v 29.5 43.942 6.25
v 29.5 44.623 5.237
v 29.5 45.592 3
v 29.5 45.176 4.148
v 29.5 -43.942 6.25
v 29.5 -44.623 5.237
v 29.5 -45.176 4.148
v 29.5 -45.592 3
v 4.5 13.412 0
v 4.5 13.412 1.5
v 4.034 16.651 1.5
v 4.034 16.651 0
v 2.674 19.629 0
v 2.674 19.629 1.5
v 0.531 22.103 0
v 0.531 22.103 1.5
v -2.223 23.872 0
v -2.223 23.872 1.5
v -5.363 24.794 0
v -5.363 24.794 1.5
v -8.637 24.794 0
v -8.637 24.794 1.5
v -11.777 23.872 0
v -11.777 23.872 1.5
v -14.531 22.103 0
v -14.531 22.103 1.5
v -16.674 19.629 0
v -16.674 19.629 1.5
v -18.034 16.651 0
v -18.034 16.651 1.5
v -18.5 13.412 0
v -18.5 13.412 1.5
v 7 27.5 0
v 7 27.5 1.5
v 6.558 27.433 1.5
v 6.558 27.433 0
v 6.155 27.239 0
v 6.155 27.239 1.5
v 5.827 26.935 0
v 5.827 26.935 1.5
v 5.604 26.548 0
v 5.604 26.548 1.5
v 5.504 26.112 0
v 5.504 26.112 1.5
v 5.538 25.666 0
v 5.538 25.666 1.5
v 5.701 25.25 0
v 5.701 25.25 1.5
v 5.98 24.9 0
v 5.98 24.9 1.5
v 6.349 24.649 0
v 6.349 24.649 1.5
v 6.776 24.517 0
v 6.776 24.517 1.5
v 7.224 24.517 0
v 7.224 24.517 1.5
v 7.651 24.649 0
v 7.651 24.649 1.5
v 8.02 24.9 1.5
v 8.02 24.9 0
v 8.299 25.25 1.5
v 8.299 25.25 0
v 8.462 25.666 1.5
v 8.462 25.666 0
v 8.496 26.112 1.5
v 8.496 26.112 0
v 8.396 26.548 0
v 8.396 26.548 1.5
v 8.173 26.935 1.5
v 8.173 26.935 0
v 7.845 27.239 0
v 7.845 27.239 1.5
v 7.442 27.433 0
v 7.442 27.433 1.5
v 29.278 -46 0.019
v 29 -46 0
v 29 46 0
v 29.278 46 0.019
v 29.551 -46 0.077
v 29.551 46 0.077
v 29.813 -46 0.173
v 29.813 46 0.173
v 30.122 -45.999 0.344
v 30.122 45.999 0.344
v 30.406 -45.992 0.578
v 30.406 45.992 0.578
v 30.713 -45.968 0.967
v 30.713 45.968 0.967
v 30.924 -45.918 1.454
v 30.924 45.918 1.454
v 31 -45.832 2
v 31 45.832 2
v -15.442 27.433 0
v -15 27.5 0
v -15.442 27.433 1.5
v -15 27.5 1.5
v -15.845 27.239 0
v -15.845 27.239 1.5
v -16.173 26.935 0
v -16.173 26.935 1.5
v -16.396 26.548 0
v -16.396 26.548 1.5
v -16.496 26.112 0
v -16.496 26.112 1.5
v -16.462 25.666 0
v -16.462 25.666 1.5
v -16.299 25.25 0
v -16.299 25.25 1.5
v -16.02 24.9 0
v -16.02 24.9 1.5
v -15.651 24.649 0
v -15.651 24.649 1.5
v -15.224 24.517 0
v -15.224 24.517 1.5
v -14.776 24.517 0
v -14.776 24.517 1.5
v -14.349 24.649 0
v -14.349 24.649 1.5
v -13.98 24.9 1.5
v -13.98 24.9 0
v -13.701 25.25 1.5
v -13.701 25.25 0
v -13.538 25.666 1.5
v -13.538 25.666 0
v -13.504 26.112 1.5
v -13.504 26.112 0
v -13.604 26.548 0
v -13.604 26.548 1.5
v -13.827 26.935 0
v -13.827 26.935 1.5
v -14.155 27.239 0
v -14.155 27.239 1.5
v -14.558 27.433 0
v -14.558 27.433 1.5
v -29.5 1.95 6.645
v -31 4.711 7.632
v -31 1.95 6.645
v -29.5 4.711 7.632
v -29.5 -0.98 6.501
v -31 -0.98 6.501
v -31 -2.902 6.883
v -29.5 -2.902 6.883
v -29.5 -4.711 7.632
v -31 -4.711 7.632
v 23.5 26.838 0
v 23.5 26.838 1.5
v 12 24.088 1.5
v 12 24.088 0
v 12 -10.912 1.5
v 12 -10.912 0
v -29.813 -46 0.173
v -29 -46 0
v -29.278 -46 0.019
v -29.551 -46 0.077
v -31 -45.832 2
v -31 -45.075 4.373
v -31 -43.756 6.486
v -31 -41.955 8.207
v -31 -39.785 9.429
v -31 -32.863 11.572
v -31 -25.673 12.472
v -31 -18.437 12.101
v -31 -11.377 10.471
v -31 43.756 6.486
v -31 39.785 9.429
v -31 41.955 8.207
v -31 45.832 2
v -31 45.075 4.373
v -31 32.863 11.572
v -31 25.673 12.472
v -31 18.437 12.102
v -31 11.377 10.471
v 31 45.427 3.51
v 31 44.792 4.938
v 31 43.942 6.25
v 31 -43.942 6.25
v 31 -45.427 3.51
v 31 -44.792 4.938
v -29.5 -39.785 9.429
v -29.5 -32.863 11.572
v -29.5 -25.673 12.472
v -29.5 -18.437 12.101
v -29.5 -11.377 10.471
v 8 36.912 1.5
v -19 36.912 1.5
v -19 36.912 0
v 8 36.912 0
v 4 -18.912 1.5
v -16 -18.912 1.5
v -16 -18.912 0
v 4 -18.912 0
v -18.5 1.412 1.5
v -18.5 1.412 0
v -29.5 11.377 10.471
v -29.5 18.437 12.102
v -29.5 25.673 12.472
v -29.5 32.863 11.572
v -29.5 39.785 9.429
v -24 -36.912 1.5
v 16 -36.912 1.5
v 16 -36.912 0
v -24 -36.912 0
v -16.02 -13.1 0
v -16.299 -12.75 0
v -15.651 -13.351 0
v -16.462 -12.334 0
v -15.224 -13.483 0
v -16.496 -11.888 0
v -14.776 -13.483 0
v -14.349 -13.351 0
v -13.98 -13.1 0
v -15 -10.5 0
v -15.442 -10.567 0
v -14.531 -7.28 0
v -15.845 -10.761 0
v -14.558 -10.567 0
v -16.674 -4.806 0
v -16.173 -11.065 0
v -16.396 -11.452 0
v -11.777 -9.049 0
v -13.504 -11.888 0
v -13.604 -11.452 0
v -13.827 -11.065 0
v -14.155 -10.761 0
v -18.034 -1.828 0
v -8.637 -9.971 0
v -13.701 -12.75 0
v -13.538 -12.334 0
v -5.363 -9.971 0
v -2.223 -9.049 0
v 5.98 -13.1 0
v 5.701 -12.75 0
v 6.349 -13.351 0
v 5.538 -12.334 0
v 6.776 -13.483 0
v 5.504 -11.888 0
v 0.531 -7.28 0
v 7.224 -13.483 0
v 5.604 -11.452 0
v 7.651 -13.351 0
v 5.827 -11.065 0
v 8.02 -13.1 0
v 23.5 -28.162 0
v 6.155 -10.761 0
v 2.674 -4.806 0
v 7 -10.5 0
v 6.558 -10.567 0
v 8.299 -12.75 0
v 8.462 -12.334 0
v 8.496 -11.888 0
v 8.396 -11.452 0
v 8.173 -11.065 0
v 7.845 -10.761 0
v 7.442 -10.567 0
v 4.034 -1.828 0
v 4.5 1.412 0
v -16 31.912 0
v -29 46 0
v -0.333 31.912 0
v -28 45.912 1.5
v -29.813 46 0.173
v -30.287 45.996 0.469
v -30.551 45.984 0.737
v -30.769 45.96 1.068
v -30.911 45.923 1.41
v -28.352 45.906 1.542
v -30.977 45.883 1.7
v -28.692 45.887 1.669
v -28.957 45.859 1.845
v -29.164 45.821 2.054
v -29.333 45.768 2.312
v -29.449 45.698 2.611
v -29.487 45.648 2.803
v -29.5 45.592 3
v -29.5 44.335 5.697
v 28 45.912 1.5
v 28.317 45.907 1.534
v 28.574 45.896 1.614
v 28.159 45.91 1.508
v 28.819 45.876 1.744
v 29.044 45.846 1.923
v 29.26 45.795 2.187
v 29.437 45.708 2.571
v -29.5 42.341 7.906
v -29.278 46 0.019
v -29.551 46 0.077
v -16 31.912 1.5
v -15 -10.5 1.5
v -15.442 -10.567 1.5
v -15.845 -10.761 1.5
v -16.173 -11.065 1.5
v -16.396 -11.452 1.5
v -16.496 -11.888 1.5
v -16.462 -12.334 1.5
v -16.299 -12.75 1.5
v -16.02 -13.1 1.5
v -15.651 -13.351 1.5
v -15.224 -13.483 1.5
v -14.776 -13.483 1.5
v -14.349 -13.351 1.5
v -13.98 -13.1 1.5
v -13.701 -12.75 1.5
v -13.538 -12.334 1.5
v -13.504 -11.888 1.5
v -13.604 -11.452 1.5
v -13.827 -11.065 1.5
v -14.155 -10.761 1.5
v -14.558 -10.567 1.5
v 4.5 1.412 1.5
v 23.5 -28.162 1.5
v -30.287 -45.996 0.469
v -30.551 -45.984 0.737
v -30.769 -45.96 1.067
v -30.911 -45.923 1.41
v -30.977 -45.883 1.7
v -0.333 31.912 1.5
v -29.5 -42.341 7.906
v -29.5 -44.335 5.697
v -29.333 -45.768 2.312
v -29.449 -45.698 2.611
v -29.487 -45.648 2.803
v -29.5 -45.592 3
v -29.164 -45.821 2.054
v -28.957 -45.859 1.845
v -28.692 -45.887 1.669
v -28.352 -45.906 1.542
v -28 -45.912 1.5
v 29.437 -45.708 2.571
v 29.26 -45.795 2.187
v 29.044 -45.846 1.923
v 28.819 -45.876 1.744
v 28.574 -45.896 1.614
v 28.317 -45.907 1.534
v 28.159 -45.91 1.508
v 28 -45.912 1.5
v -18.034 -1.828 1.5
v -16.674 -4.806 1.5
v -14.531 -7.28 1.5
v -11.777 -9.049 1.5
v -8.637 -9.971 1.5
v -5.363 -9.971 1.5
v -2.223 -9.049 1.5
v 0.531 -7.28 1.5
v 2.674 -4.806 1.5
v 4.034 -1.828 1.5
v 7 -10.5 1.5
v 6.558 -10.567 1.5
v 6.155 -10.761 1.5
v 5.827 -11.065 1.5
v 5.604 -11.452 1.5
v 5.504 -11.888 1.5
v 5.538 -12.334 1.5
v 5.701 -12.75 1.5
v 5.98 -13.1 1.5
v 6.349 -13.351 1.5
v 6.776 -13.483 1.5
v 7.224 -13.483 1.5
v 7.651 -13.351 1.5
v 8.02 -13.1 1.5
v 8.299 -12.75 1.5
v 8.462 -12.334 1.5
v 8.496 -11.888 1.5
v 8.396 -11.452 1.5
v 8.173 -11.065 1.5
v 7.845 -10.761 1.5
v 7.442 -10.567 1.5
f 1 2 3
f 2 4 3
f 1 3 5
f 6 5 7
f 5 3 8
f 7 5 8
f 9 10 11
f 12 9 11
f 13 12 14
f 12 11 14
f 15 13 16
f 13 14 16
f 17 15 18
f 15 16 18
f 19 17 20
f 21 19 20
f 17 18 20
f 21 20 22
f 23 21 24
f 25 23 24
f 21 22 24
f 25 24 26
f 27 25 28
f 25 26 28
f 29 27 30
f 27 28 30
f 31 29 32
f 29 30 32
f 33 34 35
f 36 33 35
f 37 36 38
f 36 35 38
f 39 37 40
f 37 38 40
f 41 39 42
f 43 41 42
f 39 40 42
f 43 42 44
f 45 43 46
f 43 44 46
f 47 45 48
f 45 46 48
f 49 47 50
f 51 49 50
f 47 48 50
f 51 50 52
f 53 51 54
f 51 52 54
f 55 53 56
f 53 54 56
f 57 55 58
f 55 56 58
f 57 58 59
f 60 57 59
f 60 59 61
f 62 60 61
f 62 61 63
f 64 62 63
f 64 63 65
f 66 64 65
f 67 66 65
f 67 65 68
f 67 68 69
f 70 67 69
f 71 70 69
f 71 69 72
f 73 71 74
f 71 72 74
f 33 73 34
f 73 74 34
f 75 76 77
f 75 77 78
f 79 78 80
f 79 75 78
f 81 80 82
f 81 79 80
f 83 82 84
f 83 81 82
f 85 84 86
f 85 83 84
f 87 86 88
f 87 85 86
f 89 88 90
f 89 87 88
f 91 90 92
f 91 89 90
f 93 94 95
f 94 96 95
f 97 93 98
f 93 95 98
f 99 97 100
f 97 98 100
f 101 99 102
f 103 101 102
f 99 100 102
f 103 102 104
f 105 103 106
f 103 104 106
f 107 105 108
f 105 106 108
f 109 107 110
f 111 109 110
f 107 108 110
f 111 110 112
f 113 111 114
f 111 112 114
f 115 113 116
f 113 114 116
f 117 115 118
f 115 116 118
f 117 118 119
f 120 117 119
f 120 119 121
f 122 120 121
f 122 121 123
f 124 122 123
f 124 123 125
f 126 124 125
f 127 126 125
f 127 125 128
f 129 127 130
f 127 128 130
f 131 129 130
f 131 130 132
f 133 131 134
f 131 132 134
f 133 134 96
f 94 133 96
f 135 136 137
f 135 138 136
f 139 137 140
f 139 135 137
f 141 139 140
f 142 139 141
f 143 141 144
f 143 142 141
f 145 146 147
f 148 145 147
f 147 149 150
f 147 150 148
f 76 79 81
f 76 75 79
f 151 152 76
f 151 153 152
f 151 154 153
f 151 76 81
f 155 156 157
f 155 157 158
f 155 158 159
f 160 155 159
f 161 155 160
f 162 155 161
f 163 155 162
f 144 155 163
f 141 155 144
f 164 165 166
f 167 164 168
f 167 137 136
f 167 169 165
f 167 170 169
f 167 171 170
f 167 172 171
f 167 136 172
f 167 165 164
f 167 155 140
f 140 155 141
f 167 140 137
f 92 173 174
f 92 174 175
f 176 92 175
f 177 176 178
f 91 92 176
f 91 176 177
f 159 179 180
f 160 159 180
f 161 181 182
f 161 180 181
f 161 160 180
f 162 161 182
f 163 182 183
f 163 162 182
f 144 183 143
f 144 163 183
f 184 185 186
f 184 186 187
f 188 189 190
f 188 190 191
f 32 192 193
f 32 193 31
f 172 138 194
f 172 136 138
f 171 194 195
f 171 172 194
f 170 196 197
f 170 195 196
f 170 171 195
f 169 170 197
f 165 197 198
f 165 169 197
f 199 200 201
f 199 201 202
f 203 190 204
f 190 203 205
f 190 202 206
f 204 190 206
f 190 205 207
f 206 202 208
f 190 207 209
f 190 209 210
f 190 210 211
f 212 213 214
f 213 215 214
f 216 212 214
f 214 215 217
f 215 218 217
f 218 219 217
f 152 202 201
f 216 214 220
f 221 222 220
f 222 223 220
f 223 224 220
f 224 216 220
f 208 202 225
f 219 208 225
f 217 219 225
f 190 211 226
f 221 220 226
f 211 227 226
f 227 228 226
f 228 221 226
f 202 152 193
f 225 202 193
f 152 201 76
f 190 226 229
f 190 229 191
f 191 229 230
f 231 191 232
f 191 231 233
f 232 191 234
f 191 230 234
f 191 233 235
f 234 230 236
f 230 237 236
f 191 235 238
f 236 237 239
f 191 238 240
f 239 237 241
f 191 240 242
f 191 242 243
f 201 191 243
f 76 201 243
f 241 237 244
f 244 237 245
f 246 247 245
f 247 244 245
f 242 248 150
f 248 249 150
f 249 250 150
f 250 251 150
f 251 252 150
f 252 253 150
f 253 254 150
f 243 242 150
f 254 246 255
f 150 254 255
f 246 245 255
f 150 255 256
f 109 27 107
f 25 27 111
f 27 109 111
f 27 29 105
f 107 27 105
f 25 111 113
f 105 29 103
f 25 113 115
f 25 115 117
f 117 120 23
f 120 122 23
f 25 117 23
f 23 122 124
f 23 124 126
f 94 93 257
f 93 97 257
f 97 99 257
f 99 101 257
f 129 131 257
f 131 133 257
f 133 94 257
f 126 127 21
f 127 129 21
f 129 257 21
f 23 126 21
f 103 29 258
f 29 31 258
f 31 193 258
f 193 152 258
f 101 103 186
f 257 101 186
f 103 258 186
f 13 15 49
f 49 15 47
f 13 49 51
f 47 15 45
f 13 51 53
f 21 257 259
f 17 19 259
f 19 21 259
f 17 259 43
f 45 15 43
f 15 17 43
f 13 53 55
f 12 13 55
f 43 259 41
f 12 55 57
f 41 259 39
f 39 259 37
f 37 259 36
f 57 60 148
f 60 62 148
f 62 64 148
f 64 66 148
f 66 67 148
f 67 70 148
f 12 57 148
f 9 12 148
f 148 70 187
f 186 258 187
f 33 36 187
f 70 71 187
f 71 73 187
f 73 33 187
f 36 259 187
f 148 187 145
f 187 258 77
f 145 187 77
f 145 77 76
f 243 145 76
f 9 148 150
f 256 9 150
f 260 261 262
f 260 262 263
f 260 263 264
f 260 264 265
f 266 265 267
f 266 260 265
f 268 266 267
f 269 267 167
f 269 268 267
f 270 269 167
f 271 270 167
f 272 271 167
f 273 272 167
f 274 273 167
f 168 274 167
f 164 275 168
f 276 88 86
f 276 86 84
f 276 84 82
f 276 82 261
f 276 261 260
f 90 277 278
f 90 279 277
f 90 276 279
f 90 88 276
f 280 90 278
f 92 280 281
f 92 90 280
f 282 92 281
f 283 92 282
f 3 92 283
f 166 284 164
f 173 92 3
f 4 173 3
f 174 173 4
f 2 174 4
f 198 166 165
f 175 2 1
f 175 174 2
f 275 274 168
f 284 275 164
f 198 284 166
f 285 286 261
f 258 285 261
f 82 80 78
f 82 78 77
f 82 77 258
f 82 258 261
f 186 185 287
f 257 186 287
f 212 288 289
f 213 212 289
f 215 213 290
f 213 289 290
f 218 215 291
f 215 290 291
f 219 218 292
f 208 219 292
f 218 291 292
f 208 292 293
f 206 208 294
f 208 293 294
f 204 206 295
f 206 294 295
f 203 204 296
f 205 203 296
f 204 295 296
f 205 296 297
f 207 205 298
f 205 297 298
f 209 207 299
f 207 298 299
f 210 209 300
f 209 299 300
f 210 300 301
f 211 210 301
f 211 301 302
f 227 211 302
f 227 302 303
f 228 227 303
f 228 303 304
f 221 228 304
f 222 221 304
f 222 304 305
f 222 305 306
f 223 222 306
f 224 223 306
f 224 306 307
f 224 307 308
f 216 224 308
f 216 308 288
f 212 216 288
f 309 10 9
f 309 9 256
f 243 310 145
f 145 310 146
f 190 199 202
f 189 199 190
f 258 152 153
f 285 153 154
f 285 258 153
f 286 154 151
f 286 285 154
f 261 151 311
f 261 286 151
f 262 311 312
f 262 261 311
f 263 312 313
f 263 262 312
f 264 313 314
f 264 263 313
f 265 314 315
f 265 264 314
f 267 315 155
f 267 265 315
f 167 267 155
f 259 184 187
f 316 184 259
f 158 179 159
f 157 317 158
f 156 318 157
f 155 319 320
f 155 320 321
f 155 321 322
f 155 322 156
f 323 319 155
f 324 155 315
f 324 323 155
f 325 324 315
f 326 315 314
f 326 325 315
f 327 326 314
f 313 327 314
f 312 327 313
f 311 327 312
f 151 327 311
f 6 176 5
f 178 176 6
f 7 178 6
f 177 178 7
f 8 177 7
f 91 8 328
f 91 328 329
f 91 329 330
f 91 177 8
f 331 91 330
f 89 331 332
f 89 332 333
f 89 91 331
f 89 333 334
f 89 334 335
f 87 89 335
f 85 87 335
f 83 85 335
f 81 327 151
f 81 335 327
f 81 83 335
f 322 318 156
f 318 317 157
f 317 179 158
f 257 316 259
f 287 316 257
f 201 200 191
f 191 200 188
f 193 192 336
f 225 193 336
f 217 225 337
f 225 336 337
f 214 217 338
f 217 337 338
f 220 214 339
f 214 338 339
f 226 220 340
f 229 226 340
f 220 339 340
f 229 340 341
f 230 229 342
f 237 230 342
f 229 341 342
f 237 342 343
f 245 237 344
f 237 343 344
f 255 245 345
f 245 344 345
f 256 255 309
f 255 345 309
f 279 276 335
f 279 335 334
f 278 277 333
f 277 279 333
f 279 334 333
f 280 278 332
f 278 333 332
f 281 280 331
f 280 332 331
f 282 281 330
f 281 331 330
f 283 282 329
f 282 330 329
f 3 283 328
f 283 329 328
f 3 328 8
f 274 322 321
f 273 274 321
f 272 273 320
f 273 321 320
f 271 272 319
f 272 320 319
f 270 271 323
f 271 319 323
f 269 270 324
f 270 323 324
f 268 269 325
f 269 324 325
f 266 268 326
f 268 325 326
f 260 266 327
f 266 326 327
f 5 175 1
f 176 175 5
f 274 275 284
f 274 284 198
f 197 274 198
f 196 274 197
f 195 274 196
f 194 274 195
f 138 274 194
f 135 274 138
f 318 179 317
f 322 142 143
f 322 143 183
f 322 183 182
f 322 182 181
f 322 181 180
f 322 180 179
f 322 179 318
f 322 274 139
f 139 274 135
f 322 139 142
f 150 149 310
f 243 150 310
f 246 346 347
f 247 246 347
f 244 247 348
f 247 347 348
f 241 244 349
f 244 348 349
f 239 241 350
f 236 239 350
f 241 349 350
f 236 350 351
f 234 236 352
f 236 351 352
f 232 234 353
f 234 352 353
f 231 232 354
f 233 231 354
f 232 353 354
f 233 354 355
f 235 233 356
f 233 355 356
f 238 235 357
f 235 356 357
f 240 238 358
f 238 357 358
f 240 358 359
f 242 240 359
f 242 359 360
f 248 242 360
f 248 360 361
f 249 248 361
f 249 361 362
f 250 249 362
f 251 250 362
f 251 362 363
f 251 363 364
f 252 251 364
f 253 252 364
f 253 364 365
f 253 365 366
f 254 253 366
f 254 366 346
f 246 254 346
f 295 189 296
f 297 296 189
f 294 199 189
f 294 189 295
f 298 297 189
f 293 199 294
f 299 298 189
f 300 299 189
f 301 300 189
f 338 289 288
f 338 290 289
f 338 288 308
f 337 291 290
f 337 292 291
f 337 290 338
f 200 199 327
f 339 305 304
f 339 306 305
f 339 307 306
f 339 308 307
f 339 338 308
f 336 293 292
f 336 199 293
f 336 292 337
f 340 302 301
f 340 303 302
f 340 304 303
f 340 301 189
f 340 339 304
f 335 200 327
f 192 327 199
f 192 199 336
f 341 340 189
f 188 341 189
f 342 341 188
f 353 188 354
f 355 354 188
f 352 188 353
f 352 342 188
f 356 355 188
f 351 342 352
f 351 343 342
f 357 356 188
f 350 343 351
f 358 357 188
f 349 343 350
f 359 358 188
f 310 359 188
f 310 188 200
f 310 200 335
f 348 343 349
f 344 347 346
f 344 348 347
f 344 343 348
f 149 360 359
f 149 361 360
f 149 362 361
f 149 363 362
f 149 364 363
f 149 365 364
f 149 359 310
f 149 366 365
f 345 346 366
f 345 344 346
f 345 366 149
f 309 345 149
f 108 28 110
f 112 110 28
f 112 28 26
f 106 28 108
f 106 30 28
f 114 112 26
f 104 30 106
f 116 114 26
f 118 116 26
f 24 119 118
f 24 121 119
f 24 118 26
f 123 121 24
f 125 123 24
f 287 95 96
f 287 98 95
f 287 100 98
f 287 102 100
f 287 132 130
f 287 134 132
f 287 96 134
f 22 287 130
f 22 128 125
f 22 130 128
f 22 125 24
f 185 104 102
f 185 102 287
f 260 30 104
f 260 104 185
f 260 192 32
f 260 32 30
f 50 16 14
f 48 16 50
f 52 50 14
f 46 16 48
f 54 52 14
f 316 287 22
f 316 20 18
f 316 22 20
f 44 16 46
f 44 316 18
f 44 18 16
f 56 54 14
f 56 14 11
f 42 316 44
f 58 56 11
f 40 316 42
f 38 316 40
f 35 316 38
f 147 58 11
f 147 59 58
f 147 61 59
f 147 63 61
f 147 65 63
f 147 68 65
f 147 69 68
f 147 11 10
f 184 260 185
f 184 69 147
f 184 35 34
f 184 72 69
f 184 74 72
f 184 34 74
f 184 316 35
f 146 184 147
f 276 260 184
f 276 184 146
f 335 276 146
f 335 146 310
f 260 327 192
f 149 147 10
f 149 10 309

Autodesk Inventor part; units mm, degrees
ref_plane "YZ Plane" through (0, 0, 0) normal (1, 0, 0) x (0, 1, 0)
ref_plane "XZ Plane" through (0, 0, 0) normal (0, 1, 0) x (-1, 0, 0)
ref_plane "XY Plane" through (0, 0, 0) normal (0, 0, 1) x (1, 0, 0)
sketch "スケッチ1" plane through (0, 0, 0) normal (0, 0, 1) x (1, 0, 0)
  line L0 (-31, 46) -> (31, 46)
  line L1 (31, 46) -> (31, -46)
  line L2 (31, -46) -> (-31, -46)
  line L3 (-31, -46) -> (-31, 46)
  point P0 (0, 0)
  dimension "d0" = 92
  dimension "d1" = 46
  dimension "d2" = 62
  dimension "d3" = 31
extrude "押し出し1" add sketch "スケッチ1" along normal blind 1.5
sketch "スケッチ3" plane through (0, 0, 0) normal (0, 0, -1) x (-1, 0, 0)
  circle A0 centre (-7, 26) radius 1.5
  circle A1 centre (15, 26) radius 1.5
  circle A2 centre (-7, -12) radius 1.5
  circle A3 centre (15, -12) radius 1.5
  line L0 (31, 46) -> (-31, 46) projected
  line L1 (31, -46) -> (31, 46) projected
  point P0 (0, 0)
  dimension "d10" = 3
  dimension "d11" = 22
  dimension "d12" = 22
  dimension "d15" = 38
  dimension "d16" = 38
  dimension "d35" = 20
  dimension "d36" = 20
  dimension "d44" = 16
  dimension "d45" = 16
hole "穴1" at (-15, -12, 0) at (-15, 26, 0) at (7, 26, 0) at (7, -12, 0) direction (0, 0, 1) diameter 3 end through all
sketch "スケッチ4" plane through (0, 0, 1.5) normal (0, 0, 1) x (1, 0, 0)
  line L0 (-31, -46) -> (-31, 46) projected
  line L1 (31, -46) -> (-31, -46) projected
  line L2 (-31, 46) -> (-29.5, 46)
  line L3 (-29.5, 46) -> (-29.5, -46)
  line L4 (-29.5, -46) -> (-31, -46)
  line L5 (-31, -46) -> (-31, 46)
  line L6 (31, 46) -> (29.5, 46)
  line L7 (29.5, 46) -> (29.5, -46)
  line L8 (29.5, -46) -> (31, -46)
  line L9 (31, -46) -> (31, 46)
  point P0 (0, 0)
  dimension "d37" = 59
  dimension "d39" = 1.5
extrude "押し出し3" add sketch "スケッチ4" along normal blind 11
sketch "スケッチ5" plane through (-31, -46, 0) normal (-1, 0, 0) x (0, 0, 1)
  line L0 (0, 92) -> (12.5, 92) projected
  line L1 (0, 0) -> (0, 92) projected
  line L2 (0, 0) -> (12.5, 0) projected
  line L3 (12.5, 92) -> (12.5, 0) projected
  arc A0 (4.6931, 46) -> (6.25, 92) centre (-28.7857, 70.1595) ccw
  arc A1 (6.25, 0) -> (4.6931, 46) centre (-28.7857, 21.8405) ccw
  point P0 (0, 46)
extrude "押し出し4" cut sketch "スケッチ5" against normal blind 1.5 contours L0 L3 A0 | L3 A1 A0 | A1 L3 L2
sketch "スケッチ6" plane through (31, -46, 0) normal (1, 0, 0) x (0, 0, -1)
  line L0 (0, 0) -> (-12.5, 0) projected
  line L1 (-12.5, 92) -> (-6.25, 92)
  line L2 (-6.25, 92) -> (-6.25, 0)
  line L3 (-6.25, 0) -> (-12.5, 0)
  line L4 (-12.5, 0) -> (-12.5, 92)
  point P0 (0, 46)
extrude "押し出し5" cut sketch "スケッチ6" against normal blind 1.5
fillet "フィレット4" radius 10 3 edges at (-30.25, -46, 6.25) (-30.25, 0, 4.6931) (-30.25, 46, 6.25)
sketch "スケッチ7" plane through (0, 0, 1.5) normal (0, 0, 1) x (1, 0, 0)
  line L0 (-29.5, 45.9115) -> (29.5, 45.9115) projected
  line L1 (-29.5, 45.9115) -> (-29.5, -45.9115) projected
  line L2 (29.5, -45.9115) -> (-29.5, -45.9115) projected
  line L3 (29.5, -45.9115) -> (29.5, 45.9115) projected
  line L4 (4.5, 13.4115) -> (4.5, 1.4115)
  line L5 (-18.5, 1.4115) -> (-18.5, 13.4115)
  line L6 (-19, 36.9115) -> (8, 36.9115)
  line L7 (-0.3333, 31.9115) -> (-16, 31.9115)
  line L8 (-16, -18.9115) -> (4, -18.9115)
  line L9 (16, -36.9115) -> (-24, -36.9115)
  line L10 (-24, -36.9115) -> (-16, -18.9115)
  line L11 (16, -36.9115) -> (4, -18.9115)
  line L12 (31, 18.1628) -> (29.5, 17.5573)
  line L13 (-19, 36.9115) -> (-16, 31.9115)
  line L14 (8, 36.9115) -> (-0.3333, 31.9115)
  arc A0 (-18.5, 1.4115) -> (4.5, 1.4115) centre (-7, 1.4115) ccw
  arc A1 (4.5, 13.4115) -> (-18.5, 13.4115) centre (-7, 13.4115) ccw
  line L15 (-31, 39.7846) -> (-31, 4.7108) projected
  line L16 (-31, -4.7108) -> (-31, -39.7846) projected
  line L17 (31, 43.9415) -> (31, -43.9415) projected
  line L18 (12, -10.9115) -> (23.5, -28.1615)
  line L19 (23.5, -28.1615) -> (23.5, 26.8385)
  line L20 (23.5, 26.8385) -> (12, 24.0885)
  line L21 (12, -10.9115) -> (12, 24.0885)
  line L22 (29.5, -43.9415) -> (29.5, 43.9415) projected
  point P0 (0, 0)
  dimension "d62" = 12
  dimension "d63" = 11.5
  dimension "d64" = 11.5
  dimension "d65" = 23
  dimension "d68" = 32.5
  dimension "d70" = 5
  dimension "d72" = 18
  dimension "d73" = 27
  dimension "d77" = 9
  dimension "d78" = 13.5
  dimension "d79" = 10.5
  dimension "d80" = 11
  dimension "d83" = 24
  dimension "d84" = 24
  dimension "d89" = 40
  dimension "d92" = 20
  dimension "d93" = 9
  dimension "d102" = 7
  dimension "d103" = 15
  dimension "d114" = 35
  dimension "d115" = 55
  dimension "d118" = 11.5
  dimension "d119" = 6
  dimension "d120" = 35
extrude "押し出し6" cut sketch "スケッチ7" against normal blind 1.5 contours L4 A0 L5 A1 | L6 L14 L7 L13 | L8 L11 L9 L10 | L21 L20 L19 L18
fillet "フィレット5" radius 2 2 edges at (-31, 0, 0) (31, 0, 0)
fillet "フィレット5" radius 1.5 2 edges at (-29.5, 0, 1.5) (29.5, 0, 1.5)
properties material "アセタール樹脂、白"
